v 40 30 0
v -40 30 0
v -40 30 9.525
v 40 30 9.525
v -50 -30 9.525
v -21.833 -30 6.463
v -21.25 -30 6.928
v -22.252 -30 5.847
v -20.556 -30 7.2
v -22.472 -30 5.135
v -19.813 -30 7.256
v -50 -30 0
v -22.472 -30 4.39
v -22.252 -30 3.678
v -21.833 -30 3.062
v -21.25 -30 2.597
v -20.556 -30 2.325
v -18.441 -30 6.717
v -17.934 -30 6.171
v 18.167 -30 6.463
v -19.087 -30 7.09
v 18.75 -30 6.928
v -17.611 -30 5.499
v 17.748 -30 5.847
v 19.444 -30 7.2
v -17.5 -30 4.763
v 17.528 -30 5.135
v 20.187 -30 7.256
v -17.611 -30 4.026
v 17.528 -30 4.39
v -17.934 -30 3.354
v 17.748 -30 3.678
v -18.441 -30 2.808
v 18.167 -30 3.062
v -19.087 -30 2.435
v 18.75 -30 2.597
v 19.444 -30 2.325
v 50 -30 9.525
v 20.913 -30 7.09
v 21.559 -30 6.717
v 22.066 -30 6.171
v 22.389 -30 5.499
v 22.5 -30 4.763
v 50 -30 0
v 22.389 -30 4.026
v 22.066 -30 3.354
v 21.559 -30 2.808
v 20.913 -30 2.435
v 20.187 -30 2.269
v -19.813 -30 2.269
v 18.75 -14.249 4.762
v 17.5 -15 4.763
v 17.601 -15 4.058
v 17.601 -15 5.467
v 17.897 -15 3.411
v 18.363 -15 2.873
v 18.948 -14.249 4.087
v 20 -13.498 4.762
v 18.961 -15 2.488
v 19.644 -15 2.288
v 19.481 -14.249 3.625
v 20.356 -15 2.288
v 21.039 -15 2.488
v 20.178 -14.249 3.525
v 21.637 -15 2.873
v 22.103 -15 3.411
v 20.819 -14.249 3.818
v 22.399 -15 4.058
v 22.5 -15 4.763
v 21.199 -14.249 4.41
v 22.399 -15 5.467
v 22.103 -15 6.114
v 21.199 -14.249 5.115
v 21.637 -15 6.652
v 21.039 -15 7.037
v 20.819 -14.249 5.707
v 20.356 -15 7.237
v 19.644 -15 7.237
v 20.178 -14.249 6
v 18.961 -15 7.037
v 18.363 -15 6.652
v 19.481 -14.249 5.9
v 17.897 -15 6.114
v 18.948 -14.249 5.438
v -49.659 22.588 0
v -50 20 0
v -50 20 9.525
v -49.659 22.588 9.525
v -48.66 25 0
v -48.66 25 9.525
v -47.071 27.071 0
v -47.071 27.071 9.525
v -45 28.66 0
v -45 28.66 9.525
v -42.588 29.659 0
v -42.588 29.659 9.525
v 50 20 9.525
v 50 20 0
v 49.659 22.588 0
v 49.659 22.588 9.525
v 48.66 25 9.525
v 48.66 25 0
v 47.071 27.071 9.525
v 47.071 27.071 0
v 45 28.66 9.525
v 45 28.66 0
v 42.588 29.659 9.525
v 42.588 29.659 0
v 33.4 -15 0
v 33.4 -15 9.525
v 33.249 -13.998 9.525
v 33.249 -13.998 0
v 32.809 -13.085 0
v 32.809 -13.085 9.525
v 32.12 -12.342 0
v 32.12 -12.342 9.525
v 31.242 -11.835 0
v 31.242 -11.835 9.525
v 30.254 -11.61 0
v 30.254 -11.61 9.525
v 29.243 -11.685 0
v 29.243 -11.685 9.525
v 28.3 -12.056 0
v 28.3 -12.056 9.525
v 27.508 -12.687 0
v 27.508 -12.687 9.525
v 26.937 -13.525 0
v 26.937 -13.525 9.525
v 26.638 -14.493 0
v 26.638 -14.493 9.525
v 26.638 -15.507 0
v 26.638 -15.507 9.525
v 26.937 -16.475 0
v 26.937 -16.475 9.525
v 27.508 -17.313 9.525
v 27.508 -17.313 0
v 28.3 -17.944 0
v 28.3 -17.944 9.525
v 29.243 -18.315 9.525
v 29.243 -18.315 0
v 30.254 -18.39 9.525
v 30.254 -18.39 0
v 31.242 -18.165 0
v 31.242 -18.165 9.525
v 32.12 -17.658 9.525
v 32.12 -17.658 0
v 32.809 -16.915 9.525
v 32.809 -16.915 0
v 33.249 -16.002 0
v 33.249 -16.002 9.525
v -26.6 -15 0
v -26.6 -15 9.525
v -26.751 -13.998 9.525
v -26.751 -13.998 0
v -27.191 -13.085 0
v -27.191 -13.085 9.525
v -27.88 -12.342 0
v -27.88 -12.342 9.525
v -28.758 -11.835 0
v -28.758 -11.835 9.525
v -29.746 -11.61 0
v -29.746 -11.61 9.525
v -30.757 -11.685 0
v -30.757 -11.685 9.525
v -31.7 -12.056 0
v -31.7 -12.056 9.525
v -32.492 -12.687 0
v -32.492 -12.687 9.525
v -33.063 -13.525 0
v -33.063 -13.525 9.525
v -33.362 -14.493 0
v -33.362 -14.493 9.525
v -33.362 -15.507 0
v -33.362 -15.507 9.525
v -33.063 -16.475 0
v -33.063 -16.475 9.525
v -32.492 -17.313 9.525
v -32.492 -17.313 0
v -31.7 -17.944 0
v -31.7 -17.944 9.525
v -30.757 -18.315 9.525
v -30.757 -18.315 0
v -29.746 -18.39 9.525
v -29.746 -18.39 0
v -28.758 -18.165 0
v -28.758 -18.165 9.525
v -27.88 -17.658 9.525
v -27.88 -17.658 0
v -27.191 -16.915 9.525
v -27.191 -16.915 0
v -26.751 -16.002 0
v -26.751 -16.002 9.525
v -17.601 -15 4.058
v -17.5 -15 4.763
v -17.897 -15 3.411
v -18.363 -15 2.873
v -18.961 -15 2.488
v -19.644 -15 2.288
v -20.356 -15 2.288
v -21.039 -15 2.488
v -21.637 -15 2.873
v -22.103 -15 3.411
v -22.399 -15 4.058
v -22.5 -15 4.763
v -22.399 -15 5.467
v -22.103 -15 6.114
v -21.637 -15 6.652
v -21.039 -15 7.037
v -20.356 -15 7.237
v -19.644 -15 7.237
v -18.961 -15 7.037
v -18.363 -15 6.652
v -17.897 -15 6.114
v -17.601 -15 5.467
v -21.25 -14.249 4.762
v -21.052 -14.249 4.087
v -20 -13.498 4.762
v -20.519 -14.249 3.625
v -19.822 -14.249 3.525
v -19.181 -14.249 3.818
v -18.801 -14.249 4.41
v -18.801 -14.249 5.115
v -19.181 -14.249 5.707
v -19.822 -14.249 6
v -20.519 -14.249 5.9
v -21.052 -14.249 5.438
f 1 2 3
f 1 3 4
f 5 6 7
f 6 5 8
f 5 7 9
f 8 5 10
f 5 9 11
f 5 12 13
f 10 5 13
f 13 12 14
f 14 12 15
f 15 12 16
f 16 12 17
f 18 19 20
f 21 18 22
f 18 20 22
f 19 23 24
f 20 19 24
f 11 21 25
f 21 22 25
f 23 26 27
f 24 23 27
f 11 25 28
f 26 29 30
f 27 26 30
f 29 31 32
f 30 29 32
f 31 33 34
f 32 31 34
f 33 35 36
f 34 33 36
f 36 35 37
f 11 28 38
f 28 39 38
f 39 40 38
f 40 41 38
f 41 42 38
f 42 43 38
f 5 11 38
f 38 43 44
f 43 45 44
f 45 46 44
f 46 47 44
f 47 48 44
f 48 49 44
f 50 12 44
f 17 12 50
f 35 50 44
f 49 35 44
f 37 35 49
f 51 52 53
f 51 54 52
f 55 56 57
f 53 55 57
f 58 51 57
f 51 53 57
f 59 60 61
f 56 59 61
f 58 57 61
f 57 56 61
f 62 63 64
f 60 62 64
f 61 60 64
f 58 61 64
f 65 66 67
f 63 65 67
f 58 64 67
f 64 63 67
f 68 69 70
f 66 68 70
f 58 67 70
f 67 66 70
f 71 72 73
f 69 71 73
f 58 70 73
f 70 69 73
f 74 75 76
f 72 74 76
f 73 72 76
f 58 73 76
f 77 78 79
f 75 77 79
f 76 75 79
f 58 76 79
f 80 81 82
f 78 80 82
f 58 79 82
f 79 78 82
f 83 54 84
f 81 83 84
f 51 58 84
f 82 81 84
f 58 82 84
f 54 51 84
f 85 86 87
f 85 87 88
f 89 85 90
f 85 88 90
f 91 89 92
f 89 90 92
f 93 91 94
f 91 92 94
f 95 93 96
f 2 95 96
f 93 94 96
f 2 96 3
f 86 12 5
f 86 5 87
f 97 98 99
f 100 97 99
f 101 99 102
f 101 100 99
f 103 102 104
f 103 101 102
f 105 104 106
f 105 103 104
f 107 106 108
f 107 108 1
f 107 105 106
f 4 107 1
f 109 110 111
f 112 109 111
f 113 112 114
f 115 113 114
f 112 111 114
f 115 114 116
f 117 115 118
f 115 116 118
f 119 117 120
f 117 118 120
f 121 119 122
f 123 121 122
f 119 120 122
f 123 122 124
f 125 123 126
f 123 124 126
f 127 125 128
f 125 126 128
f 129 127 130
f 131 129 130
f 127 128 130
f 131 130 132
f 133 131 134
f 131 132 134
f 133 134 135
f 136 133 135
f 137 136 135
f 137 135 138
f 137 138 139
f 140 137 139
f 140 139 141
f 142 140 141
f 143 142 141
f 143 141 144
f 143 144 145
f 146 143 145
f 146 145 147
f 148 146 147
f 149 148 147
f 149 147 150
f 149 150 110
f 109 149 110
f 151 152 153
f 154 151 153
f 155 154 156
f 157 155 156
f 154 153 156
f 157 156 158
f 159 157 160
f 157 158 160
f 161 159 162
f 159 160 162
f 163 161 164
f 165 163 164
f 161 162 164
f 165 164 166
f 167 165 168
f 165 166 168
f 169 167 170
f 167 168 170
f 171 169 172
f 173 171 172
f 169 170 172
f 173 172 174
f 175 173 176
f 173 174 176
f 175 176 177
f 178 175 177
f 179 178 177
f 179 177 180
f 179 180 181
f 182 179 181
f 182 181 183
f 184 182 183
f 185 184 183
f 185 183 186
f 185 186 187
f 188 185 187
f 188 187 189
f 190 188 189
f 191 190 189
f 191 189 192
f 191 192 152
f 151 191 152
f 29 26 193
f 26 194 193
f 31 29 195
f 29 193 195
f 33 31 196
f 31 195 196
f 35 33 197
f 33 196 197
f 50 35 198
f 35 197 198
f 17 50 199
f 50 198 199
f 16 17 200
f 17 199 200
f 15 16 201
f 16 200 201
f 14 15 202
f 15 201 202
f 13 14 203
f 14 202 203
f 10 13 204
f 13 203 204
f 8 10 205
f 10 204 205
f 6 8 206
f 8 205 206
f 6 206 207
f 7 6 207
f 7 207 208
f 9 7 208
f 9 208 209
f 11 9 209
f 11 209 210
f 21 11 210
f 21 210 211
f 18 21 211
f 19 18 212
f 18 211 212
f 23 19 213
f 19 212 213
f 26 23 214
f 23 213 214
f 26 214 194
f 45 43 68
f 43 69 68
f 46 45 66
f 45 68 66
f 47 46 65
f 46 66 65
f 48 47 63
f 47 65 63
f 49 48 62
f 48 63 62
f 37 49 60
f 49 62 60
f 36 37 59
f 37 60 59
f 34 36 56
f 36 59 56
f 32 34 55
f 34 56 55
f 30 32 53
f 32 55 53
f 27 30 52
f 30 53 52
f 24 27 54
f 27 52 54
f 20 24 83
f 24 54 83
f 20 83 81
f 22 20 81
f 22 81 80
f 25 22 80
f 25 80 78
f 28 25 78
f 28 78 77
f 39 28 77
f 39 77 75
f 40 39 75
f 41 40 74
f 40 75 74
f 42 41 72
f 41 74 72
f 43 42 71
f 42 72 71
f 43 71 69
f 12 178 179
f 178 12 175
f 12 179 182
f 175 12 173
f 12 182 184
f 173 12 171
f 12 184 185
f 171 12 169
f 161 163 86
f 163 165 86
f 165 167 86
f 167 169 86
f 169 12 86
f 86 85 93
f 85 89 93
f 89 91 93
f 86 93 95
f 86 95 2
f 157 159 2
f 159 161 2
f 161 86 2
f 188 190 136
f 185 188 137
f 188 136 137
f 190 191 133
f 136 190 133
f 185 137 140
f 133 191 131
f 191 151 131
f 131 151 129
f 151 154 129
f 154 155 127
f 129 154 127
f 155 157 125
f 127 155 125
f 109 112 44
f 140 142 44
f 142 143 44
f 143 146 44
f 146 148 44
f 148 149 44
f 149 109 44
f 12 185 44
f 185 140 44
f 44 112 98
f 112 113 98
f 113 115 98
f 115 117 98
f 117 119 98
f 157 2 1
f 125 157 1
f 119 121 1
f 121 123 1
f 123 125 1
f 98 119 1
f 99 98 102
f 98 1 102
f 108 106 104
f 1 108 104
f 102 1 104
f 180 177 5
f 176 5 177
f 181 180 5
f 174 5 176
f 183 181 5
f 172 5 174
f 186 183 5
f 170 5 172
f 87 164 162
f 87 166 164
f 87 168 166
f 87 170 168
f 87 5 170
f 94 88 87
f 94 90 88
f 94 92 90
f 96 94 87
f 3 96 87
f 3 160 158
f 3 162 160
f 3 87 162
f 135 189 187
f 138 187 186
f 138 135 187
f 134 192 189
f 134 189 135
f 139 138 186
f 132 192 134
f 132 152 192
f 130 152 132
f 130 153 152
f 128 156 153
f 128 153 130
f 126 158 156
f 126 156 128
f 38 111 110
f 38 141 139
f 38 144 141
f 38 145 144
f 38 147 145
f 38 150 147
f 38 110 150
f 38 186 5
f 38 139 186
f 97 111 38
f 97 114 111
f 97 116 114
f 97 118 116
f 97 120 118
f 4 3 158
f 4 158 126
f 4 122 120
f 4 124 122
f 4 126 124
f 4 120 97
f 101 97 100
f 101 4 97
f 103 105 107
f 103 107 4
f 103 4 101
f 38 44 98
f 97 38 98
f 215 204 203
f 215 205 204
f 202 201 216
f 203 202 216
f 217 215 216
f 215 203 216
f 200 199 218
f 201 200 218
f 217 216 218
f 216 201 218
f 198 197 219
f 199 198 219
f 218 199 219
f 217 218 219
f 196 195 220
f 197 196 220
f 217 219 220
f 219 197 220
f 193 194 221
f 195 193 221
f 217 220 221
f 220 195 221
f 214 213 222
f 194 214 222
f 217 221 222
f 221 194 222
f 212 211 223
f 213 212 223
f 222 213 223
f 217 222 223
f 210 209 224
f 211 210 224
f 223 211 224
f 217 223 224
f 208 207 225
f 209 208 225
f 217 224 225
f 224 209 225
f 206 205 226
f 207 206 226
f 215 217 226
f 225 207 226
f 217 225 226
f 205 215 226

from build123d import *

# Parameters (mm, degrees)
ESBO_O1_W                 = 100
ESBO_O1_H                 = 60
RESSALTO_EXTRUS_O1_DEPTH  = 9.525
FILETE1_R                 = 10
FURO_ROSCADO_DE_M61_D     = 5
FURO_ROSCADO_DE_M61_DEPTH = 15
FURO_ROSCADO_DE_M61_TIP   = 1.502151548
ESBO_O5_R                 = 3
CORTE_EXTRUS_O1_DEPTH     = 60.082363062
FURO_ROSCADO_DE_M82_D     = 6.8


with BuildPart() as part:
    # Esboço1 → Ressalto-extrusão1 (new body)
    with BuildSketch(Plane.XY):
        Rectangle(ESBO_O1_W, ESBO_O1_H)
    extrude(amount=RESSALTO_EXTRUS_O1_DEPTH)

    # Filete1
    filete1_edges = [part.edges().sort_by_distance(p)[0] for p in [
        (-50, 30, 4.7625),
        (50, 30, 4.7625),
    ]]
    fillet(filete1_edges, radius=FILETE1_R)

    # Furo roscado de M61
    with Locations(Plane(origin=(0, -30, 0), x_dir=(-1, 0, 0), z_dir=(0, -1, 0))):
        with Locations((20, -4.7625), (-20, -4.7625)):
            Hole(FURO_ROSCADO_DE_M61_D / 2, depth=FURO_ROSCADO_DE_M61_DEPTH)
            with Locations((0, 0, -(FURO_ROSCADO_DE_M61_DEPTH + FURO_ROSCADO_DE_M61_TIP / 2))):  # 118° drill point
                Cone(0, FURO_ROSCADO_DE_M61_D / 2, FURO_ROSCADO_DE_M61_TIP, mode=Mode.SUBTRACT)

    # Esboço5 → Corte-extrusão1 (cut, through all)
    with BuildSketch(Plane.XY.offset(9.525)):
        with Locations((30, -15)):
            Circle(ESBO_O5_R)
        with Locations((-30, -15)):
            Circle(ESBO_O5_R)
    extrude(amount=-CORTE_EXTRUS_O1_DEPTH, mode=Mode.SUBTRACT)

    # Furo roscado de M82 (through all)
    with Locations(Plane(origin=(30, -15, 0), x_dir=(-1, 0, 0), z_dir=(0, 0, -1))):
        with Locations((0, 0), (60, 0)):
            Hole(FURO_ROSCADO_DE_M82_D / 2)


solid = part.part
